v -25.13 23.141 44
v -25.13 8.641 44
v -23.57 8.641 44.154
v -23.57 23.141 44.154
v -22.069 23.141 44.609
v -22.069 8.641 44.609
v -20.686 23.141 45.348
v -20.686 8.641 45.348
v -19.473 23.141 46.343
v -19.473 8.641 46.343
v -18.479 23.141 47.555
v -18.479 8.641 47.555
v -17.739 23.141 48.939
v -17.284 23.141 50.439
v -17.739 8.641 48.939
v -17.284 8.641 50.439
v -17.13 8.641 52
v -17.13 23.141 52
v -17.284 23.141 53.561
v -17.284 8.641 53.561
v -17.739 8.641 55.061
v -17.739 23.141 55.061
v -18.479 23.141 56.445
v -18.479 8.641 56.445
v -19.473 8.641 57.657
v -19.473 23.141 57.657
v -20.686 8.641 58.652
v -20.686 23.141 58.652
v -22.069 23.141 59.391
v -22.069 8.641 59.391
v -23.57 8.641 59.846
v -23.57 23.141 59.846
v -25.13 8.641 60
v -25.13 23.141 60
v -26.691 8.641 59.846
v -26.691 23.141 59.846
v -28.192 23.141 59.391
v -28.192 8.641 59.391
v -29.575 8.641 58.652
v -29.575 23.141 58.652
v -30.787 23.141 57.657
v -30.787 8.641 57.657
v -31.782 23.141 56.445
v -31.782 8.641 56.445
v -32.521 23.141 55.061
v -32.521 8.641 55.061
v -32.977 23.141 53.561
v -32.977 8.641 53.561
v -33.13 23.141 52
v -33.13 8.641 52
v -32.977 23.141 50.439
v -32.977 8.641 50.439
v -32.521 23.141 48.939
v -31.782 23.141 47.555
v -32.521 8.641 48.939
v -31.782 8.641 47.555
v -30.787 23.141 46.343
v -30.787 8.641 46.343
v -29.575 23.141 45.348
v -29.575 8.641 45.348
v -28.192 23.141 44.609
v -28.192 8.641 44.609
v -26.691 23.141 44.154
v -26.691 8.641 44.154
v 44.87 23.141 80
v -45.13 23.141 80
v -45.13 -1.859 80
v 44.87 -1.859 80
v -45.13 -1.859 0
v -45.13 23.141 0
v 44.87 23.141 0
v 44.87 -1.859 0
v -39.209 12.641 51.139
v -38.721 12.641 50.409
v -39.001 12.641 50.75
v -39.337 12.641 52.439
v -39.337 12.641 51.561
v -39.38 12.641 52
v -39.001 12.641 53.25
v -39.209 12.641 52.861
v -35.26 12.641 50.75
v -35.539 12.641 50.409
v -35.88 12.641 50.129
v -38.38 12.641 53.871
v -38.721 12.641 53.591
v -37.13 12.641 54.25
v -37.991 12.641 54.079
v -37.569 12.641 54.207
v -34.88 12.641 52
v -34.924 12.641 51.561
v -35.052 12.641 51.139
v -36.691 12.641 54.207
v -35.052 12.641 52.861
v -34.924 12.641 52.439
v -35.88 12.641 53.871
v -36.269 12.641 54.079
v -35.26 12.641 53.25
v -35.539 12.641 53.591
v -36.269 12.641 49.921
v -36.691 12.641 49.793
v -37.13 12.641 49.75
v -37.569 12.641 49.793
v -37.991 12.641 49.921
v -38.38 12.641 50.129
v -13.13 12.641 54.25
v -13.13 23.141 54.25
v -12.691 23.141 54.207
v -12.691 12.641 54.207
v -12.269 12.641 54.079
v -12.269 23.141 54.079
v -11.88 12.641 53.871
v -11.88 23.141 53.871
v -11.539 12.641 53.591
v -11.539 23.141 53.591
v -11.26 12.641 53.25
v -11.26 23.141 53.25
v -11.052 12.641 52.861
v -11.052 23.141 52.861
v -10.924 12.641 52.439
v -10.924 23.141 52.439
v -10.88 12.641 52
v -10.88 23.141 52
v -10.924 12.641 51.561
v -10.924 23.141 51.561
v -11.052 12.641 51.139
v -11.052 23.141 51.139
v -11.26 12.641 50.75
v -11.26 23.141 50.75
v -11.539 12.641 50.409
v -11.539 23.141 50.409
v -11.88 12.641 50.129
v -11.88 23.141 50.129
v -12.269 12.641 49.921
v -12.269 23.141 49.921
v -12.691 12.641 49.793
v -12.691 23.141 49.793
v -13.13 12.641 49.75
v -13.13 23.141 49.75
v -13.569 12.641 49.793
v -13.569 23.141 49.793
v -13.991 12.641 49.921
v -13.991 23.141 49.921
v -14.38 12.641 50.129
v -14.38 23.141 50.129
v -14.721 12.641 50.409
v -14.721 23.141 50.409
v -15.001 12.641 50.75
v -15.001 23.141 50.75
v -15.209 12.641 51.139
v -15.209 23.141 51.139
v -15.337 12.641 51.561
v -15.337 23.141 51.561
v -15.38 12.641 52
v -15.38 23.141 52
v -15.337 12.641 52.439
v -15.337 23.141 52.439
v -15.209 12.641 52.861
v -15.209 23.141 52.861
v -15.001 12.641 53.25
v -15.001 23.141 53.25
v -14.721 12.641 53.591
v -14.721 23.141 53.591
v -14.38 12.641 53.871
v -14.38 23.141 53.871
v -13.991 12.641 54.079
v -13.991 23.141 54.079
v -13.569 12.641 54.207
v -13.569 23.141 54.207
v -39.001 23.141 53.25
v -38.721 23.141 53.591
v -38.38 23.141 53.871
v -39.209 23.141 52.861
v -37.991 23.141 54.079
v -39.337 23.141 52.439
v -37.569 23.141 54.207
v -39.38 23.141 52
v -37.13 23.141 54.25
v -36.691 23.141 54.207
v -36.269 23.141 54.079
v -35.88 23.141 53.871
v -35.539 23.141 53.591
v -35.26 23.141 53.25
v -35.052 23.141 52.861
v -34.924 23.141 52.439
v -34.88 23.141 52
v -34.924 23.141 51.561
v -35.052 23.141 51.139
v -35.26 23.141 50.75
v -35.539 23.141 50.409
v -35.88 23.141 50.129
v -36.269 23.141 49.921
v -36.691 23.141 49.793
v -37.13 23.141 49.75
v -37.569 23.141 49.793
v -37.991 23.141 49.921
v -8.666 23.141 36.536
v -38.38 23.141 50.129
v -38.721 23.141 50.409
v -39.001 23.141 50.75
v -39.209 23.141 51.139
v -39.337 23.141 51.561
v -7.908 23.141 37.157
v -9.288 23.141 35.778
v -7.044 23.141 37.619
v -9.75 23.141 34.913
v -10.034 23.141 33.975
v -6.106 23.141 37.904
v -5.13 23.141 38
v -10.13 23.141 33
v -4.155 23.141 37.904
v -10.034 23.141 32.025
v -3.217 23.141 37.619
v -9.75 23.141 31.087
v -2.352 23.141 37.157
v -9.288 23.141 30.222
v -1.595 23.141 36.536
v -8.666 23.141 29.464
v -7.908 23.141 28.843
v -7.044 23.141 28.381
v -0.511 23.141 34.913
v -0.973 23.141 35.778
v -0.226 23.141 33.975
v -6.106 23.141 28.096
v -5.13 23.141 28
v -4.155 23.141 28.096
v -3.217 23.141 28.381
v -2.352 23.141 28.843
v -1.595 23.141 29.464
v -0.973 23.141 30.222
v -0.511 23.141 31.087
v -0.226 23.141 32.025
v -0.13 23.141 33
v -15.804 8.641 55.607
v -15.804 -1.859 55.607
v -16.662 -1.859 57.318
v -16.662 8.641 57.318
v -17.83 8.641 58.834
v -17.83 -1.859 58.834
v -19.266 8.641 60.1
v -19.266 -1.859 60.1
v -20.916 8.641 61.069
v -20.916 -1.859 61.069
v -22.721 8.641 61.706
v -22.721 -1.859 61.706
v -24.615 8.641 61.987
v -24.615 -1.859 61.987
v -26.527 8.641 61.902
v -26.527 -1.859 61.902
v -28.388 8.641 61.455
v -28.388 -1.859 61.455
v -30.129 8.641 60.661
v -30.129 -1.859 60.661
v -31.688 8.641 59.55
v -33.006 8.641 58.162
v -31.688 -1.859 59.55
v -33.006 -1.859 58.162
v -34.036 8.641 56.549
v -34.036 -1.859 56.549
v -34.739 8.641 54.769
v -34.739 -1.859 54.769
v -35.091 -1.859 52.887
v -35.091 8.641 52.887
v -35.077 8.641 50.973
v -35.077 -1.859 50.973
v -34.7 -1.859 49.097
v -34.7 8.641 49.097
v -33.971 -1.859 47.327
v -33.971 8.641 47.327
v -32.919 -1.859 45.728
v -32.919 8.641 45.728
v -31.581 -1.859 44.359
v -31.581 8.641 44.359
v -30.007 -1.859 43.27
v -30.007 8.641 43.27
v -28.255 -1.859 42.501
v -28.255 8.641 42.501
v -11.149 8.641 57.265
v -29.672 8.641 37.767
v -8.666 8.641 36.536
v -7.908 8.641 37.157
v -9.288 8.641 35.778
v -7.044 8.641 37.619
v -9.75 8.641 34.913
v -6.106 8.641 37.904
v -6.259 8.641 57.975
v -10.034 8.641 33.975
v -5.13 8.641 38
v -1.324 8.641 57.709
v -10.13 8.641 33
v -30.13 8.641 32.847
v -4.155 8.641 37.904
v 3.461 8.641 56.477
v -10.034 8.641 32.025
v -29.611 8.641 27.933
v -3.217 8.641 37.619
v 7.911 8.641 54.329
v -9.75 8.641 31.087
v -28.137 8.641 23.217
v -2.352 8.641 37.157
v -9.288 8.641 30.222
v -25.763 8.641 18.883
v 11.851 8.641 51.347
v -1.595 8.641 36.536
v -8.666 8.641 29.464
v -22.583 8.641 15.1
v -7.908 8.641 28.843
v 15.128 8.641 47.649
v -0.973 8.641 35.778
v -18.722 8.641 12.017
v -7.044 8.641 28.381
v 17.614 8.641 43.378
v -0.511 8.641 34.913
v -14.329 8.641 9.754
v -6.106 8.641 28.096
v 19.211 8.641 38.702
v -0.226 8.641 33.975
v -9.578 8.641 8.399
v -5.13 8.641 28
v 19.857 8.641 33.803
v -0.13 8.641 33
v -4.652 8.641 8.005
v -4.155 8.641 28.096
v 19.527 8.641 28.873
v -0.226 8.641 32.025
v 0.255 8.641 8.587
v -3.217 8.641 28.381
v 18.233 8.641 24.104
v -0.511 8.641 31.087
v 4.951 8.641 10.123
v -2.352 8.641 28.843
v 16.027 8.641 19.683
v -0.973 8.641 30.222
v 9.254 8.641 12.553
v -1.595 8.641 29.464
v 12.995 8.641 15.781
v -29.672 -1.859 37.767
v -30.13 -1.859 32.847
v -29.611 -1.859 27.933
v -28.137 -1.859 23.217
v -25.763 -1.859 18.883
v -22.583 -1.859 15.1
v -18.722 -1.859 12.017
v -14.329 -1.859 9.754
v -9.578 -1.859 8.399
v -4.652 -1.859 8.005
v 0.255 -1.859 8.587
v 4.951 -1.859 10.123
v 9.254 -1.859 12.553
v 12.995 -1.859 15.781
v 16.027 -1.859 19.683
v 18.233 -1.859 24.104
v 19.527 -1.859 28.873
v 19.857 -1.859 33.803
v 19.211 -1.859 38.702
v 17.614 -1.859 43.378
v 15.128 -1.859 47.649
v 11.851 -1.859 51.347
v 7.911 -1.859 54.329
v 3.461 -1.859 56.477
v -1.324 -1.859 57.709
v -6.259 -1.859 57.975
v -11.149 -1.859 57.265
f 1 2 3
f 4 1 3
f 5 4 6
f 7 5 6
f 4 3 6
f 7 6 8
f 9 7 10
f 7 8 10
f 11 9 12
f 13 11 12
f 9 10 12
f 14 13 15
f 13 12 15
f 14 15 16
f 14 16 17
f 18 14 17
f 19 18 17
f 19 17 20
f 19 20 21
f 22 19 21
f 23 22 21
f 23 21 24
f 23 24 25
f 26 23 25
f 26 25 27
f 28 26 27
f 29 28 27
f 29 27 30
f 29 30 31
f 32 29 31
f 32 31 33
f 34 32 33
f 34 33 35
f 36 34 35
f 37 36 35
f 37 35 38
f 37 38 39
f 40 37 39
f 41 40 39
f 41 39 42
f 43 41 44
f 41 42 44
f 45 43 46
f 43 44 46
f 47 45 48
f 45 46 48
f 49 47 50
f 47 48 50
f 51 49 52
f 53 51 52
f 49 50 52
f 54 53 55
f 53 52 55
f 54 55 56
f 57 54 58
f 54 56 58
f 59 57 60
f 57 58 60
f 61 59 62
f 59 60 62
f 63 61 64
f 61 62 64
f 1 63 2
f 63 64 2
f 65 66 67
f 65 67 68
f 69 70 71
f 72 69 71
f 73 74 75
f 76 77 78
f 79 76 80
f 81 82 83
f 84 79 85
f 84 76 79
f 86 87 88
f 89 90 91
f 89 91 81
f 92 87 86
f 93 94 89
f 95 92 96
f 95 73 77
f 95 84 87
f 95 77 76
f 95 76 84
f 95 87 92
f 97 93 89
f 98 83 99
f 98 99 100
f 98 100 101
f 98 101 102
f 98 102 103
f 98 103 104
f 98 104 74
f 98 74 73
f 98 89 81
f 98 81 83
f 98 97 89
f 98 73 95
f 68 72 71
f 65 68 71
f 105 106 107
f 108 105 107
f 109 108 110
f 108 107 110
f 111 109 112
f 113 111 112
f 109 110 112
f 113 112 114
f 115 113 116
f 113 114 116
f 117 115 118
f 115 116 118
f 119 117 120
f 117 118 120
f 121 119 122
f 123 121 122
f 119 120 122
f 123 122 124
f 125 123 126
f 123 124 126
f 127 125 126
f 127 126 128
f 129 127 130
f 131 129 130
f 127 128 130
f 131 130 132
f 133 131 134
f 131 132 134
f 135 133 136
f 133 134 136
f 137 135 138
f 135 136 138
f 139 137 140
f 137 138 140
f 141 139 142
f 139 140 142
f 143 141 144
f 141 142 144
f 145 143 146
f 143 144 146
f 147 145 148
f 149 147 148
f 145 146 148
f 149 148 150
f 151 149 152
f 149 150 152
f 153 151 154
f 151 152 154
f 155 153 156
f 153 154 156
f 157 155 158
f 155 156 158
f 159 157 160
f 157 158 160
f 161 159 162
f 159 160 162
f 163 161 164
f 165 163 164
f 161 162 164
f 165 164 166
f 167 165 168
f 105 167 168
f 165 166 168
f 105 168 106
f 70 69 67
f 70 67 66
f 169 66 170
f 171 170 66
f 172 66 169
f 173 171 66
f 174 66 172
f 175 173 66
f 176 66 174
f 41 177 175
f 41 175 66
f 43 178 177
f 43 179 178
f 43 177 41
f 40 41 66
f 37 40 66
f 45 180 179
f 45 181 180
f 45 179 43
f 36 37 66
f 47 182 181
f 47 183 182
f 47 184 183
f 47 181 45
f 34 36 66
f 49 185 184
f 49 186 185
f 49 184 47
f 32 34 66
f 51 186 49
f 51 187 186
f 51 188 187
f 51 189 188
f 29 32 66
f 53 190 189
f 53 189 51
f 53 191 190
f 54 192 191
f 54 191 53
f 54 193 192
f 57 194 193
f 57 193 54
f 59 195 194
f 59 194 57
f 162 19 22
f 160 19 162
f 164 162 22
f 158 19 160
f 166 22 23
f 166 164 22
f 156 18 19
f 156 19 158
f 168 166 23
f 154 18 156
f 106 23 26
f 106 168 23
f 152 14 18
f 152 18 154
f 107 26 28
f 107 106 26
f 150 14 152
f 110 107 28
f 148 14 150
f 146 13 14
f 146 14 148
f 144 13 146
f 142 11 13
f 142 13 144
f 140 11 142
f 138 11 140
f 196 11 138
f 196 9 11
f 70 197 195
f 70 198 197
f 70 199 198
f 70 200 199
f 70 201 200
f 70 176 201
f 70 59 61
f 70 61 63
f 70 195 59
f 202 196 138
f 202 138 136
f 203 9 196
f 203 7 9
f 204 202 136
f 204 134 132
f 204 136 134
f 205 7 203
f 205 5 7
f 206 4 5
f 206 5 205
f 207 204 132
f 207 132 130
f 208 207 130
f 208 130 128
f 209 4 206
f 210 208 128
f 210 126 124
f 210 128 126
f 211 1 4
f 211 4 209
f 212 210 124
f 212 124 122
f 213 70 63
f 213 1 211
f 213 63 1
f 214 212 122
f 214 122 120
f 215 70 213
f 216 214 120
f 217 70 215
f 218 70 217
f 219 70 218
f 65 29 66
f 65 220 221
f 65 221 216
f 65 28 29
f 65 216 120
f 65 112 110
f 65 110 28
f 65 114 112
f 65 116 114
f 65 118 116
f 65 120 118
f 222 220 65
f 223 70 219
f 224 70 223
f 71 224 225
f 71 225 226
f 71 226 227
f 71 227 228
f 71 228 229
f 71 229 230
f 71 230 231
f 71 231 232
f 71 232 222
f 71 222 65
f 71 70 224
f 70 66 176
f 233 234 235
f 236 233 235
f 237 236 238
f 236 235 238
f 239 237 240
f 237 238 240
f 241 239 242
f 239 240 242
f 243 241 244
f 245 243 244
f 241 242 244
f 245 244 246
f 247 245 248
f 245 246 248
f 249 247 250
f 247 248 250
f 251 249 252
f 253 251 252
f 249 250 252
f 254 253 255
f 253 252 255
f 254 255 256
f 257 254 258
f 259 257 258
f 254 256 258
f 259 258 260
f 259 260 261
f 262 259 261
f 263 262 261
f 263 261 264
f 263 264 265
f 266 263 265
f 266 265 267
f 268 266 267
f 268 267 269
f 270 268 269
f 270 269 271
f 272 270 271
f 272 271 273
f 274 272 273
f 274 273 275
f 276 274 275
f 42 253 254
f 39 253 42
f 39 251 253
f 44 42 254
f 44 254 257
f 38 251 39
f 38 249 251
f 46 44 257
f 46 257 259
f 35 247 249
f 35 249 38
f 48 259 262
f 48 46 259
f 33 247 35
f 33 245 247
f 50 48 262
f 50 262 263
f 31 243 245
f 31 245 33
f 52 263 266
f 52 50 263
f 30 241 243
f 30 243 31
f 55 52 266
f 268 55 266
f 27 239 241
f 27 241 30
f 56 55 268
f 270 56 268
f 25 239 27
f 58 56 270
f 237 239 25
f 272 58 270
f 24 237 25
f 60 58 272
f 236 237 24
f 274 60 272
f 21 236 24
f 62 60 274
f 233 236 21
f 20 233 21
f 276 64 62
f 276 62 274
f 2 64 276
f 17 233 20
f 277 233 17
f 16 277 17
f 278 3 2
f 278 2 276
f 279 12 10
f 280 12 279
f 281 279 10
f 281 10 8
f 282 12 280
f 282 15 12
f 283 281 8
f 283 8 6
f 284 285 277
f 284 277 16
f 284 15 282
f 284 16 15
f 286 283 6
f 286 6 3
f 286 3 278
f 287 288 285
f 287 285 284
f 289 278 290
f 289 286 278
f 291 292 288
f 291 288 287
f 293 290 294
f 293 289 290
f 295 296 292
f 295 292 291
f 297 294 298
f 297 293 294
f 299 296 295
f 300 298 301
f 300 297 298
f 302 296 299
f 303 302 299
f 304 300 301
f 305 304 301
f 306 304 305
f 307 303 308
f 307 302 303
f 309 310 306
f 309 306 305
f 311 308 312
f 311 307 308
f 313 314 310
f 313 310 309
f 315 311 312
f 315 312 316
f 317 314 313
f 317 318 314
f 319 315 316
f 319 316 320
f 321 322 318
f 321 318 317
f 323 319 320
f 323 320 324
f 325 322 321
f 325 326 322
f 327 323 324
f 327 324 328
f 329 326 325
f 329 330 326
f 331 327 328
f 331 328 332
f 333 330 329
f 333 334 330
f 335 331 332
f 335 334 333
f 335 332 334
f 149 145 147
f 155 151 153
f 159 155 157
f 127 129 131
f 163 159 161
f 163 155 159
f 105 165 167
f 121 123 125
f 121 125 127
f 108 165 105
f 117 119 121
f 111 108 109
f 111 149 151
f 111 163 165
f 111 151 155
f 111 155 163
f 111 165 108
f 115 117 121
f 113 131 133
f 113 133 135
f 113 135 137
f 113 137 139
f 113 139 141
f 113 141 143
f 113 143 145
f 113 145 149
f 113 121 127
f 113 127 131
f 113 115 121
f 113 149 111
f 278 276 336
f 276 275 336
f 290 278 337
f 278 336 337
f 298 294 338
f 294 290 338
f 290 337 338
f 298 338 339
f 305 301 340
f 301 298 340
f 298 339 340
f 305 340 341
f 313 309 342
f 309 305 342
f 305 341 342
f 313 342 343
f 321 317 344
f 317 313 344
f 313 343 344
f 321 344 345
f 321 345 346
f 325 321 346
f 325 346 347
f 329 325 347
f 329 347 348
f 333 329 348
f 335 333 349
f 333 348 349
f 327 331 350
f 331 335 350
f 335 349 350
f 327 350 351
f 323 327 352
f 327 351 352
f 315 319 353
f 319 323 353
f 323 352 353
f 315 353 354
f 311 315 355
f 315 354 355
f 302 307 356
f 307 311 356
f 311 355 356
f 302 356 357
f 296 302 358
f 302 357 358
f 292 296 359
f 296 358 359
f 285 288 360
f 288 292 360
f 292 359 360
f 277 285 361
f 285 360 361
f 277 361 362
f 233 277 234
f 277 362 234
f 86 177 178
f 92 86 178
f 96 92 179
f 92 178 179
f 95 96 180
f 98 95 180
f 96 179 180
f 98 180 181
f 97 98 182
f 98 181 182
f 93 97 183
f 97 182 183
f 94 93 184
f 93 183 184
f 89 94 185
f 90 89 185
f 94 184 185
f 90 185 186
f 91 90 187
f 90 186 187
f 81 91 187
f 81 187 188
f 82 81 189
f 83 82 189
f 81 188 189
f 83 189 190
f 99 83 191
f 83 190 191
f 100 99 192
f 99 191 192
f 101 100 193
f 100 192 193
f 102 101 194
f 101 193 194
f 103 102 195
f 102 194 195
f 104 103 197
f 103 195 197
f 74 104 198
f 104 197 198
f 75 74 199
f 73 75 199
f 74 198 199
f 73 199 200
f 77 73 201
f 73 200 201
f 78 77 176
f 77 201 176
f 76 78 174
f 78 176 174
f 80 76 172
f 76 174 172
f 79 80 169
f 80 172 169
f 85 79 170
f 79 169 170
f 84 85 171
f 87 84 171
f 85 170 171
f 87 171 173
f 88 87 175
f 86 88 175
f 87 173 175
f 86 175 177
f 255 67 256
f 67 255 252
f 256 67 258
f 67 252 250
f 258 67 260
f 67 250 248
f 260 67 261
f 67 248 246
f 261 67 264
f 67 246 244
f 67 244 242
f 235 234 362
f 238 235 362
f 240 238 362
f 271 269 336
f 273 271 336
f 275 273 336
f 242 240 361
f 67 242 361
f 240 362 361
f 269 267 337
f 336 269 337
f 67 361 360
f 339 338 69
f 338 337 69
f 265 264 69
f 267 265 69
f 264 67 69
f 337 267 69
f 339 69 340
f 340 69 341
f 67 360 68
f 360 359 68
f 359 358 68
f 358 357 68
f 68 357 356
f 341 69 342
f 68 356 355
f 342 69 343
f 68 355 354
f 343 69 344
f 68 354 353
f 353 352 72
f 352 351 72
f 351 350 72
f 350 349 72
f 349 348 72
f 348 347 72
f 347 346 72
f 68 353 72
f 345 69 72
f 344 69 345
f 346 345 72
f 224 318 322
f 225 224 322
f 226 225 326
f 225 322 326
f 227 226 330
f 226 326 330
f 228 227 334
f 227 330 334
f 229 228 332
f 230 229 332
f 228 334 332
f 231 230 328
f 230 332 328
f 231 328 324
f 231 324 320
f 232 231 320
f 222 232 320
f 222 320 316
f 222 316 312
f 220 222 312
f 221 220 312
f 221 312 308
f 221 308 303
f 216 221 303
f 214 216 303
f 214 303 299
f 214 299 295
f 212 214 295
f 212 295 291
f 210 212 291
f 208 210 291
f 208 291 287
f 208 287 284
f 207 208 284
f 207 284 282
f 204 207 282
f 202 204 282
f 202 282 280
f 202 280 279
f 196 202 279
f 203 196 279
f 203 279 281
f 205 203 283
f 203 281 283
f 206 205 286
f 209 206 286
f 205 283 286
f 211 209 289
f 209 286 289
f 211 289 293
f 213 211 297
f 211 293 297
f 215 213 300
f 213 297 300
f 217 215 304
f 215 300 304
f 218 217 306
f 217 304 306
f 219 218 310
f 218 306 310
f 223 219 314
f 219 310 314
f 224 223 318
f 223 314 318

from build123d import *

# Parameters (mm, degrees)
SKETCH1_W              = 90
SKETCH1_H              = 25
BOSS_EXTRUDE1_DEPTH    = 80
SKETCH_1_R             = 25
CUT_EXTRUDE_1_DEPTH    = 10.5
SKETCH_2_R             = 5
CUT_EXTRUDE_2_DEPTH    = 100
SKETCH_3_R             = 8
CUT_EXTRUDE_3_DEPTH    = 100
SKETCH_4_R             = 10
CUT_EXTRUDE_4_DEPTH    = 10.5
SKETCH_5_R             = 2.25
CUT_EXTRUDE_5_DEPTH    = 10.5
PATTERN_LINEAR_1_COUNT = 2
PATTERN_LINEAR_1_PITCH = 24


with BuildPart() as part:
    # Sketch1 → Boss-Extrude1 (new body)
    with BuildSketch(Plane.XY):
        with Locations((-0.130315501, 10.641289438)):
            Rectangle(SKETCH1_W, SKETCH1_H)
    extrude(amount=BOSS_EXTRUDE1_DEPTH)

    # Эскиз1 → Вырез-Вытянуть1 (cut)
    with BuildSketch(Plane.XZ.offset(1.858710562)):
        with Locations(Location((-5.130315501, 33, 0), (0, 0, 270))):
            Circle(SKETCH_1_R)
    extrude(amount=-CUT_EXTRUDE_1_DEPTH, mode=Mode.SUBTRACT)

    # Эскиз2 → Вырез-Вытянуть2 (cut)
    with BuildSketch(Plane.XZ.offset(-8.641289438)):
        with Locations(Location((-5.130315501, 33, 0), (0, 0, 270))):
            Circle(SKETCH_2_R)
    extrude(amount=-CUT_EXTRUDE_2_DEPTH, mode=Mode.SUBTRACT)

    # Эскиз3 → Вырез-Вытянуть3 (cut)
    with BuildSketch(Plane.XZ.offset(1.858710562)):
        with Locations(Location((-25.130315501, 52, 0), (0, 0, 270))):
            Circle(SKETCH_3_R)
    extrude(amount=-CUT_EXTRUDE_3_DEPTH, mode=Mode.SUBTRACT)

    # Эскиз4 → Вырез-Вытянуть4 (cut)
    with BuildSketch(Plane.XZ.offset(1.858710562)):
        with Locations((-25.130315501, 52)):
            Circle(SKETCH_4_R)
    extrude(amount=-CUT_EXTRUDE_4_DEPTH, mode=Mode.SUBTRACT)

    # Эскиз5 → Вырез-Вытянуть5 (cut)
    with BuildSketch(Plane(origin=(0, 23.141289438, 0), x_dir=(1, 0, 0), z_dir=(0, 1, 0))):
        with Locations(Location((-37.130315501, -52, 0), (0, 0, 270))):
            Circle(SKETCH_5_R)
    cut_extrude_5 = extrude(amount=-CUT_EXTRUDE_5_DEPTH, mode=Mode.SUBTRACT)

    # Линейный массив1: Вырез-Вытянуть5 ×2
    with Locations(*[(i * PATTERN_LINEAR_1_PITCH, 0, 0) for i in range(1, PATTERN_LINEAR_1_COUNT)]):
        add(cut_extrude_5, mode=Mode.SUBTRACT)


solid = part.part
